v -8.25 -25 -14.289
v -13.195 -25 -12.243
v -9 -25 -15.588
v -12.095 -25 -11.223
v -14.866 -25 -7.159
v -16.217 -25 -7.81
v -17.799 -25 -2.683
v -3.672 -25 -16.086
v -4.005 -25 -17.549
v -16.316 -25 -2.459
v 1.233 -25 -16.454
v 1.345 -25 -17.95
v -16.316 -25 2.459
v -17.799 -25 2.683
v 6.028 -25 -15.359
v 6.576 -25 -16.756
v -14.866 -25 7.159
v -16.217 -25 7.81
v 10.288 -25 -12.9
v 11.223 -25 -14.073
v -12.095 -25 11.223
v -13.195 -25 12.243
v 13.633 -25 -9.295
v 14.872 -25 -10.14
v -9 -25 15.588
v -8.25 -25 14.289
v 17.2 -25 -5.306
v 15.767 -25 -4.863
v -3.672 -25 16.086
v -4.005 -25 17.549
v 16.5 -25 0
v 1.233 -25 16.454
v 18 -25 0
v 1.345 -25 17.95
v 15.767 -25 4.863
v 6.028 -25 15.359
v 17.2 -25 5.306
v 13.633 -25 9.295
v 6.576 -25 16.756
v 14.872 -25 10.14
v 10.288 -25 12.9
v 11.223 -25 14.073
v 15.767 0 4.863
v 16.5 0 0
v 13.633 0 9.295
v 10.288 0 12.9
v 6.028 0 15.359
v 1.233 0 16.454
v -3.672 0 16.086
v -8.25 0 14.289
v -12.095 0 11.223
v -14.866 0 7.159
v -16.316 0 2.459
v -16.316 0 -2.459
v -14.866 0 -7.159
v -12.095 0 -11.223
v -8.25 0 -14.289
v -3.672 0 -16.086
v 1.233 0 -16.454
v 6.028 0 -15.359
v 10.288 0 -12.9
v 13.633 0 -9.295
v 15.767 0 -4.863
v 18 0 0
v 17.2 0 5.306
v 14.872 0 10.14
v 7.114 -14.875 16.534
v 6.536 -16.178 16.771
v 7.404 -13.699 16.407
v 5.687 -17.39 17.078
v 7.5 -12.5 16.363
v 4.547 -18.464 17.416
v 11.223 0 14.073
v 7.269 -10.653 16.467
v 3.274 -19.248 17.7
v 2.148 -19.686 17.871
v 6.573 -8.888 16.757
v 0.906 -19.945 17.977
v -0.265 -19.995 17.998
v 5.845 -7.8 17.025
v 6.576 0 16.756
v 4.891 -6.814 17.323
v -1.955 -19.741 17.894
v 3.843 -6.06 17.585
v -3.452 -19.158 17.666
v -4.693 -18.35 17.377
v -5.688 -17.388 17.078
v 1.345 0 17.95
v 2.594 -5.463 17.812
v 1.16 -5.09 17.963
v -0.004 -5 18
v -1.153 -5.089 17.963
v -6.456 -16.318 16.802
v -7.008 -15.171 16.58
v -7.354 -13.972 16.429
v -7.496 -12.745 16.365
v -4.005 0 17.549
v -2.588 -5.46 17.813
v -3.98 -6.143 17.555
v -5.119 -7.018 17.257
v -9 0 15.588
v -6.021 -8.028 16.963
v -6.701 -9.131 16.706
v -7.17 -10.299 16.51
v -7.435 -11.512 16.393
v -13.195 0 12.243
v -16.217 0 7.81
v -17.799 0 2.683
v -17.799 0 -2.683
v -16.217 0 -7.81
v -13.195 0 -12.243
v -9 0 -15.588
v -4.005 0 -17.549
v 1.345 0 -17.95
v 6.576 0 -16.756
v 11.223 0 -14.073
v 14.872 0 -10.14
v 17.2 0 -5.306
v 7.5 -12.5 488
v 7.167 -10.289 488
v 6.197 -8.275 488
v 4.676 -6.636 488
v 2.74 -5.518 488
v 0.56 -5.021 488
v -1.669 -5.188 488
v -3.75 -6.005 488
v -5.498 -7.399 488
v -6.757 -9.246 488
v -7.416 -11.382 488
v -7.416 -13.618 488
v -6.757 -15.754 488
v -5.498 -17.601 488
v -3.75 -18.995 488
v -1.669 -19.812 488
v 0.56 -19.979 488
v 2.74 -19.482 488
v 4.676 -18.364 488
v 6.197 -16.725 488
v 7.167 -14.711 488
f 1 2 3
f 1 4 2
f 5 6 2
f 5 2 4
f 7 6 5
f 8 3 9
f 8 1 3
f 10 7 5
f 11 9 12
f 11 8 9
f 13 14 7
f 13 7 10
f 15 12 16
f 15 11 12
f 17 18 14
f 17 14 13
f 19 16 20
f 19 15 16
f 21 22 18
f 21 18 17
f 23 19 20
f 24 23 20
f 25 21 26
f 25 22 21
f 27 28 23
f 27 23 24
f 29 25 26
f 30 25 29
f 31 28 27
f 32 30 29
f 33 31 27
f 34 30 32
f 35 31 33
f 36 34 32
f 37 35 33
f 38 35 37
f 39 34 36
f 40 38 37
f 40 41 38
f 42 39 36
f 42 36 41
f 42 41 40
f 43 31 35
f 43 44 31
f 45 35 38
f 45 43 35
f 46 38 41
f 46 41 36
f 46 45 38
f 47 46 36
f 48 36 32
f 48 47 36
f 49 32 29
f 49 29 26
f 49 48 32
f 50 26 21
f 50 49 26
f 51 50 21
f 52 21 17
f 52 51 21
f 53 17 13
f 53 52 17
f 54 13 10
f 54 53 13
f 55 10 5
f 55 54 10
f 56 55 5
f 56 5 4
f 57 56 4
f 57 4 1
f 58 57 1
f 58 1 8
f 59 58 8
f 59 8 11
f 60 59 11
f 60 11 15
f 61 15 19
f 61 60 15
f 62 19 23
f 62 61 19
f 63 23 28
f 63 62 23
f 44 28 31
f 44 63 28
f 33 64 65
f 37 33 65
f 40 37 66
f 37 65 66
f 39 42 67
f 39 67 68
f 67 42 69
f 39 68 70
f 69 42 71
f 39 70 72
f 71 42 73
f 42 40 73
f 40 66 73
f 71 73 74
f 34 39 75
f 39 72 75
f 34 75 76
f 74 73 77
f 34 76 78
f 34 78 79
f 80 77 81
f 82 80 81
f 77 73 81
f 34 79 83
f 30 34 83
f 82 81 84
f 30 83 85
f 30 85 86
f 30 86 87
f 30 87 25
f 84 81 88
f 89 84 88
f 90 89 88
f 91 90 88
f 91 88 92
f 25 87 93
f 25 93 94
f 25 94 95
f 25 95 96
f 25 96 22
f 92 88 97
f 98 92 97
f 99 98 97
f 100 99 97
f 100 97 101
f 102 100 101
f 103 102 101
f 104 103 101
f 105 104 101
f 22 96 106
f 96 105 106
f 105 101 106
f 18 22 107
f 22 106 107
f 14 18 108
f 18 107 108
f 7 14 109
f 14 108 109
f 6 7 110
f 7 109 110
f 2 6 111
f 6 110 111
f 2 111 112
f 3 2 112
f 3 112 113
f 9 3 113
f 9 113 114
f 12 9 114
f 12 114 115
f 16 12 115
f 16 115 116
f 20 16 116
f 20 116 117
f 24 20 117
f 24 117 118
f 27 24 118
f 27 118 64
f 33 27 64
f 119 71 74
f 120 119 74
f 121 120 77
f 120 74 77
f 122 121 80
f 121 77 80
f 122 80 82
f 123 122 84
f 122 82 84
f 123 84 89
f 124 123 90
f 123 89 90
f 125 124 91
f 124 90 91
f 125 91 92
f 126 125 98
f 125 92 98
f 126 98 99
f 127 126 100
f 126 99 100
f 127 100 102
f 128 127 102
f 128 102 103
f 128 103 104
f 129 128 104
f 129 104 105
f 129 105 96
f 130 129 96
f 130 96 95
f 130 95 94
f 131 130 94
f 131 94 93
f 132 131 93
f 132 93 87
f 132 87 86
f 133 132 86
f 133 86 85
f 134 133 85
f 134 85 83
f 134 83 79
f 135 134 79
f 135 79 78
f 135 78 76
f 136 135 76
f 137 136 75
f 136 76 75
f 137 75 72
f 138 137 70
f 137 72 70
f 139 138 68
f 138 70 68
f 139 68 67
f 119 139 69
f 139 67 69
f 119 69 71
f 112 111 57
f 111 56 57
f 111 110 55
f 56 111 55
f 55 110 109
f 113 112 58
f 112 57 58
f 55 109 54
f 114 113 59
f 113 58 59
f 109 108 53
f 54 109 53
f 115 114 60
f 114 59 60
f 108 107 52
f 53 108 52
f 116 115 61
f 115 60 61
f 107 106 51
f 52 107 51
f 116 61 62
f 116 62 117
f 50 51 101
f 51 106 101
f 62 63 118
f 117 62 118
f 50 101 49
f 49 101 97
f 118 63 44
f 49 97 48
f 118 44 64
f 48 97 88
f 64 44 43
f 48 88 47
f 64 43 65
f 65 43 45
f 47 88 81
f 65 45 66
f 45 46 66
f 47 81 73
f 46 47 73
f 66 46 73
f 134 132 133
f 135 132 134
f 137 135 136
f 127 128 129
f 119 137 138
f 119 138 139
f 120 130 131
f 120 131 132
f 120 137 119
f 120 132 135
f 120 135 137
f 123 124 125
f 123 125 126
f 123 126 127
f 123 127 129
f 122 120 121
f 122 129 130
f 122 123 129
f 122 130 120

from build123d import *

# Parameters (mm, degrees)
F0_R          = 18
F0_R_2        = 16.5
F1_DEPTH      = 25
F2_R          = 7.5
F3_DEPTH      = 488
F4_END_RADIUS = 16.5
F3_FACE_R     = 7.5
F4_REACH      = 509.2142035356


with BuildPart() as f1:
    # F0 (on Front) → F1 (new body)
    with BuildSketch(Plane.XZ):
        Circle(F0_R)
        Circle(F0_R_2, mode=Mode.SUBTRACT)
    extrude(amount=F1_DEPTH)

    # F2 (on Top) → F3 (join)
    with BuildSketch(Plane.XY):
        with Locations((0, -12.5)):
            Circle(F2_R)
    extrude(amount=F3_DEPTH)

    f4_end = (Plane.ZX.offset(-12.5) * Cylinder(F4_END_RADIUS, 2034.2177557588, mode=Mode.PRIVATE)).faces().sort_by_distance((-16.5, -12.5, 0))[0]
    # F3_face (on face) → F4 (cut, up to the whole of a round face its end follows)
    with BuildSketch(Plane(origin=(0, -12.5, 0), x_dir=(1, 0, 0), z_dir=(0, 0, -1))):
        Circle(F3_FACE_R)
    f4_long = extrude(amount=-F4_REACH, mode=Mode.PRIVATE)
    add(split(f4_long, bisect_by=f4_end, keep=Keep.BOTTOM, mode=Mode.PRIVATE), mode=Mode.SUBTRACT)


solid = f1.part
